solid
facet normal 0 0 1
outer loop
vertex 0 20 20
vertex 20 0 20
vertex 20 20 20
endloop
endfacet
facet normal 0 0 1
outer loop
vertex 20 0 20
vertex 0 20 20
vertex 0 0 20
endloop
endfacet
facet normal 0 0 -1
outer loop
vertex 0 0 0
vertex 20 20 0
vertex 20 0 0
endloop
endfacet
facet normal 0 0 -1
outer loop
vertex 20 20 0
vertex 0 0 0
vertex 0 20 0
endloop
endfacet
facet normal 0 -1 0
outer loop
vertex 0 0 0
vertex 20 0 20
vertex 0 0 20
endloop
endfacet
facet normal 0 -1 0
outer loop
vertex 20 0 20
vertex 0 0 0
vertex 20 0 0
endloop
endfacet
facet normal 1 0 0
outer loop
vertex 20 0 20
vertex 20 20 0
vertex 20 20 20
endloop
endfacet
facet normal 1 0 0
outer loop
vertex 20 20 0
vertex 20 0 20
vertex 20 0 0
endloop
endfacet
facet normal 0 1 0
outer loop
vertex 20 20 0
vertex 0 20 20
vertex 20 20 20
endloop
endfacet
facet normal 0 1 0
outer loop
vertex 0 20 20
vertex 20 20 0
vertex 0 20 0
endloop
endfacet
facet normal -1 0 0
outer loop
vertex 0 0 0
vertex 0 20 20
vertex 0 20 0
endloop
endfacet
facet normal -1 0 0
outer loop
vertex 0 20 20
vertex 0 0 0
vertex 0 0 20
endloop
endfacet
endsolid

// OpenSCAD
// Units: mm. PCB stand worked example.
cube([20, 20, 20]);
